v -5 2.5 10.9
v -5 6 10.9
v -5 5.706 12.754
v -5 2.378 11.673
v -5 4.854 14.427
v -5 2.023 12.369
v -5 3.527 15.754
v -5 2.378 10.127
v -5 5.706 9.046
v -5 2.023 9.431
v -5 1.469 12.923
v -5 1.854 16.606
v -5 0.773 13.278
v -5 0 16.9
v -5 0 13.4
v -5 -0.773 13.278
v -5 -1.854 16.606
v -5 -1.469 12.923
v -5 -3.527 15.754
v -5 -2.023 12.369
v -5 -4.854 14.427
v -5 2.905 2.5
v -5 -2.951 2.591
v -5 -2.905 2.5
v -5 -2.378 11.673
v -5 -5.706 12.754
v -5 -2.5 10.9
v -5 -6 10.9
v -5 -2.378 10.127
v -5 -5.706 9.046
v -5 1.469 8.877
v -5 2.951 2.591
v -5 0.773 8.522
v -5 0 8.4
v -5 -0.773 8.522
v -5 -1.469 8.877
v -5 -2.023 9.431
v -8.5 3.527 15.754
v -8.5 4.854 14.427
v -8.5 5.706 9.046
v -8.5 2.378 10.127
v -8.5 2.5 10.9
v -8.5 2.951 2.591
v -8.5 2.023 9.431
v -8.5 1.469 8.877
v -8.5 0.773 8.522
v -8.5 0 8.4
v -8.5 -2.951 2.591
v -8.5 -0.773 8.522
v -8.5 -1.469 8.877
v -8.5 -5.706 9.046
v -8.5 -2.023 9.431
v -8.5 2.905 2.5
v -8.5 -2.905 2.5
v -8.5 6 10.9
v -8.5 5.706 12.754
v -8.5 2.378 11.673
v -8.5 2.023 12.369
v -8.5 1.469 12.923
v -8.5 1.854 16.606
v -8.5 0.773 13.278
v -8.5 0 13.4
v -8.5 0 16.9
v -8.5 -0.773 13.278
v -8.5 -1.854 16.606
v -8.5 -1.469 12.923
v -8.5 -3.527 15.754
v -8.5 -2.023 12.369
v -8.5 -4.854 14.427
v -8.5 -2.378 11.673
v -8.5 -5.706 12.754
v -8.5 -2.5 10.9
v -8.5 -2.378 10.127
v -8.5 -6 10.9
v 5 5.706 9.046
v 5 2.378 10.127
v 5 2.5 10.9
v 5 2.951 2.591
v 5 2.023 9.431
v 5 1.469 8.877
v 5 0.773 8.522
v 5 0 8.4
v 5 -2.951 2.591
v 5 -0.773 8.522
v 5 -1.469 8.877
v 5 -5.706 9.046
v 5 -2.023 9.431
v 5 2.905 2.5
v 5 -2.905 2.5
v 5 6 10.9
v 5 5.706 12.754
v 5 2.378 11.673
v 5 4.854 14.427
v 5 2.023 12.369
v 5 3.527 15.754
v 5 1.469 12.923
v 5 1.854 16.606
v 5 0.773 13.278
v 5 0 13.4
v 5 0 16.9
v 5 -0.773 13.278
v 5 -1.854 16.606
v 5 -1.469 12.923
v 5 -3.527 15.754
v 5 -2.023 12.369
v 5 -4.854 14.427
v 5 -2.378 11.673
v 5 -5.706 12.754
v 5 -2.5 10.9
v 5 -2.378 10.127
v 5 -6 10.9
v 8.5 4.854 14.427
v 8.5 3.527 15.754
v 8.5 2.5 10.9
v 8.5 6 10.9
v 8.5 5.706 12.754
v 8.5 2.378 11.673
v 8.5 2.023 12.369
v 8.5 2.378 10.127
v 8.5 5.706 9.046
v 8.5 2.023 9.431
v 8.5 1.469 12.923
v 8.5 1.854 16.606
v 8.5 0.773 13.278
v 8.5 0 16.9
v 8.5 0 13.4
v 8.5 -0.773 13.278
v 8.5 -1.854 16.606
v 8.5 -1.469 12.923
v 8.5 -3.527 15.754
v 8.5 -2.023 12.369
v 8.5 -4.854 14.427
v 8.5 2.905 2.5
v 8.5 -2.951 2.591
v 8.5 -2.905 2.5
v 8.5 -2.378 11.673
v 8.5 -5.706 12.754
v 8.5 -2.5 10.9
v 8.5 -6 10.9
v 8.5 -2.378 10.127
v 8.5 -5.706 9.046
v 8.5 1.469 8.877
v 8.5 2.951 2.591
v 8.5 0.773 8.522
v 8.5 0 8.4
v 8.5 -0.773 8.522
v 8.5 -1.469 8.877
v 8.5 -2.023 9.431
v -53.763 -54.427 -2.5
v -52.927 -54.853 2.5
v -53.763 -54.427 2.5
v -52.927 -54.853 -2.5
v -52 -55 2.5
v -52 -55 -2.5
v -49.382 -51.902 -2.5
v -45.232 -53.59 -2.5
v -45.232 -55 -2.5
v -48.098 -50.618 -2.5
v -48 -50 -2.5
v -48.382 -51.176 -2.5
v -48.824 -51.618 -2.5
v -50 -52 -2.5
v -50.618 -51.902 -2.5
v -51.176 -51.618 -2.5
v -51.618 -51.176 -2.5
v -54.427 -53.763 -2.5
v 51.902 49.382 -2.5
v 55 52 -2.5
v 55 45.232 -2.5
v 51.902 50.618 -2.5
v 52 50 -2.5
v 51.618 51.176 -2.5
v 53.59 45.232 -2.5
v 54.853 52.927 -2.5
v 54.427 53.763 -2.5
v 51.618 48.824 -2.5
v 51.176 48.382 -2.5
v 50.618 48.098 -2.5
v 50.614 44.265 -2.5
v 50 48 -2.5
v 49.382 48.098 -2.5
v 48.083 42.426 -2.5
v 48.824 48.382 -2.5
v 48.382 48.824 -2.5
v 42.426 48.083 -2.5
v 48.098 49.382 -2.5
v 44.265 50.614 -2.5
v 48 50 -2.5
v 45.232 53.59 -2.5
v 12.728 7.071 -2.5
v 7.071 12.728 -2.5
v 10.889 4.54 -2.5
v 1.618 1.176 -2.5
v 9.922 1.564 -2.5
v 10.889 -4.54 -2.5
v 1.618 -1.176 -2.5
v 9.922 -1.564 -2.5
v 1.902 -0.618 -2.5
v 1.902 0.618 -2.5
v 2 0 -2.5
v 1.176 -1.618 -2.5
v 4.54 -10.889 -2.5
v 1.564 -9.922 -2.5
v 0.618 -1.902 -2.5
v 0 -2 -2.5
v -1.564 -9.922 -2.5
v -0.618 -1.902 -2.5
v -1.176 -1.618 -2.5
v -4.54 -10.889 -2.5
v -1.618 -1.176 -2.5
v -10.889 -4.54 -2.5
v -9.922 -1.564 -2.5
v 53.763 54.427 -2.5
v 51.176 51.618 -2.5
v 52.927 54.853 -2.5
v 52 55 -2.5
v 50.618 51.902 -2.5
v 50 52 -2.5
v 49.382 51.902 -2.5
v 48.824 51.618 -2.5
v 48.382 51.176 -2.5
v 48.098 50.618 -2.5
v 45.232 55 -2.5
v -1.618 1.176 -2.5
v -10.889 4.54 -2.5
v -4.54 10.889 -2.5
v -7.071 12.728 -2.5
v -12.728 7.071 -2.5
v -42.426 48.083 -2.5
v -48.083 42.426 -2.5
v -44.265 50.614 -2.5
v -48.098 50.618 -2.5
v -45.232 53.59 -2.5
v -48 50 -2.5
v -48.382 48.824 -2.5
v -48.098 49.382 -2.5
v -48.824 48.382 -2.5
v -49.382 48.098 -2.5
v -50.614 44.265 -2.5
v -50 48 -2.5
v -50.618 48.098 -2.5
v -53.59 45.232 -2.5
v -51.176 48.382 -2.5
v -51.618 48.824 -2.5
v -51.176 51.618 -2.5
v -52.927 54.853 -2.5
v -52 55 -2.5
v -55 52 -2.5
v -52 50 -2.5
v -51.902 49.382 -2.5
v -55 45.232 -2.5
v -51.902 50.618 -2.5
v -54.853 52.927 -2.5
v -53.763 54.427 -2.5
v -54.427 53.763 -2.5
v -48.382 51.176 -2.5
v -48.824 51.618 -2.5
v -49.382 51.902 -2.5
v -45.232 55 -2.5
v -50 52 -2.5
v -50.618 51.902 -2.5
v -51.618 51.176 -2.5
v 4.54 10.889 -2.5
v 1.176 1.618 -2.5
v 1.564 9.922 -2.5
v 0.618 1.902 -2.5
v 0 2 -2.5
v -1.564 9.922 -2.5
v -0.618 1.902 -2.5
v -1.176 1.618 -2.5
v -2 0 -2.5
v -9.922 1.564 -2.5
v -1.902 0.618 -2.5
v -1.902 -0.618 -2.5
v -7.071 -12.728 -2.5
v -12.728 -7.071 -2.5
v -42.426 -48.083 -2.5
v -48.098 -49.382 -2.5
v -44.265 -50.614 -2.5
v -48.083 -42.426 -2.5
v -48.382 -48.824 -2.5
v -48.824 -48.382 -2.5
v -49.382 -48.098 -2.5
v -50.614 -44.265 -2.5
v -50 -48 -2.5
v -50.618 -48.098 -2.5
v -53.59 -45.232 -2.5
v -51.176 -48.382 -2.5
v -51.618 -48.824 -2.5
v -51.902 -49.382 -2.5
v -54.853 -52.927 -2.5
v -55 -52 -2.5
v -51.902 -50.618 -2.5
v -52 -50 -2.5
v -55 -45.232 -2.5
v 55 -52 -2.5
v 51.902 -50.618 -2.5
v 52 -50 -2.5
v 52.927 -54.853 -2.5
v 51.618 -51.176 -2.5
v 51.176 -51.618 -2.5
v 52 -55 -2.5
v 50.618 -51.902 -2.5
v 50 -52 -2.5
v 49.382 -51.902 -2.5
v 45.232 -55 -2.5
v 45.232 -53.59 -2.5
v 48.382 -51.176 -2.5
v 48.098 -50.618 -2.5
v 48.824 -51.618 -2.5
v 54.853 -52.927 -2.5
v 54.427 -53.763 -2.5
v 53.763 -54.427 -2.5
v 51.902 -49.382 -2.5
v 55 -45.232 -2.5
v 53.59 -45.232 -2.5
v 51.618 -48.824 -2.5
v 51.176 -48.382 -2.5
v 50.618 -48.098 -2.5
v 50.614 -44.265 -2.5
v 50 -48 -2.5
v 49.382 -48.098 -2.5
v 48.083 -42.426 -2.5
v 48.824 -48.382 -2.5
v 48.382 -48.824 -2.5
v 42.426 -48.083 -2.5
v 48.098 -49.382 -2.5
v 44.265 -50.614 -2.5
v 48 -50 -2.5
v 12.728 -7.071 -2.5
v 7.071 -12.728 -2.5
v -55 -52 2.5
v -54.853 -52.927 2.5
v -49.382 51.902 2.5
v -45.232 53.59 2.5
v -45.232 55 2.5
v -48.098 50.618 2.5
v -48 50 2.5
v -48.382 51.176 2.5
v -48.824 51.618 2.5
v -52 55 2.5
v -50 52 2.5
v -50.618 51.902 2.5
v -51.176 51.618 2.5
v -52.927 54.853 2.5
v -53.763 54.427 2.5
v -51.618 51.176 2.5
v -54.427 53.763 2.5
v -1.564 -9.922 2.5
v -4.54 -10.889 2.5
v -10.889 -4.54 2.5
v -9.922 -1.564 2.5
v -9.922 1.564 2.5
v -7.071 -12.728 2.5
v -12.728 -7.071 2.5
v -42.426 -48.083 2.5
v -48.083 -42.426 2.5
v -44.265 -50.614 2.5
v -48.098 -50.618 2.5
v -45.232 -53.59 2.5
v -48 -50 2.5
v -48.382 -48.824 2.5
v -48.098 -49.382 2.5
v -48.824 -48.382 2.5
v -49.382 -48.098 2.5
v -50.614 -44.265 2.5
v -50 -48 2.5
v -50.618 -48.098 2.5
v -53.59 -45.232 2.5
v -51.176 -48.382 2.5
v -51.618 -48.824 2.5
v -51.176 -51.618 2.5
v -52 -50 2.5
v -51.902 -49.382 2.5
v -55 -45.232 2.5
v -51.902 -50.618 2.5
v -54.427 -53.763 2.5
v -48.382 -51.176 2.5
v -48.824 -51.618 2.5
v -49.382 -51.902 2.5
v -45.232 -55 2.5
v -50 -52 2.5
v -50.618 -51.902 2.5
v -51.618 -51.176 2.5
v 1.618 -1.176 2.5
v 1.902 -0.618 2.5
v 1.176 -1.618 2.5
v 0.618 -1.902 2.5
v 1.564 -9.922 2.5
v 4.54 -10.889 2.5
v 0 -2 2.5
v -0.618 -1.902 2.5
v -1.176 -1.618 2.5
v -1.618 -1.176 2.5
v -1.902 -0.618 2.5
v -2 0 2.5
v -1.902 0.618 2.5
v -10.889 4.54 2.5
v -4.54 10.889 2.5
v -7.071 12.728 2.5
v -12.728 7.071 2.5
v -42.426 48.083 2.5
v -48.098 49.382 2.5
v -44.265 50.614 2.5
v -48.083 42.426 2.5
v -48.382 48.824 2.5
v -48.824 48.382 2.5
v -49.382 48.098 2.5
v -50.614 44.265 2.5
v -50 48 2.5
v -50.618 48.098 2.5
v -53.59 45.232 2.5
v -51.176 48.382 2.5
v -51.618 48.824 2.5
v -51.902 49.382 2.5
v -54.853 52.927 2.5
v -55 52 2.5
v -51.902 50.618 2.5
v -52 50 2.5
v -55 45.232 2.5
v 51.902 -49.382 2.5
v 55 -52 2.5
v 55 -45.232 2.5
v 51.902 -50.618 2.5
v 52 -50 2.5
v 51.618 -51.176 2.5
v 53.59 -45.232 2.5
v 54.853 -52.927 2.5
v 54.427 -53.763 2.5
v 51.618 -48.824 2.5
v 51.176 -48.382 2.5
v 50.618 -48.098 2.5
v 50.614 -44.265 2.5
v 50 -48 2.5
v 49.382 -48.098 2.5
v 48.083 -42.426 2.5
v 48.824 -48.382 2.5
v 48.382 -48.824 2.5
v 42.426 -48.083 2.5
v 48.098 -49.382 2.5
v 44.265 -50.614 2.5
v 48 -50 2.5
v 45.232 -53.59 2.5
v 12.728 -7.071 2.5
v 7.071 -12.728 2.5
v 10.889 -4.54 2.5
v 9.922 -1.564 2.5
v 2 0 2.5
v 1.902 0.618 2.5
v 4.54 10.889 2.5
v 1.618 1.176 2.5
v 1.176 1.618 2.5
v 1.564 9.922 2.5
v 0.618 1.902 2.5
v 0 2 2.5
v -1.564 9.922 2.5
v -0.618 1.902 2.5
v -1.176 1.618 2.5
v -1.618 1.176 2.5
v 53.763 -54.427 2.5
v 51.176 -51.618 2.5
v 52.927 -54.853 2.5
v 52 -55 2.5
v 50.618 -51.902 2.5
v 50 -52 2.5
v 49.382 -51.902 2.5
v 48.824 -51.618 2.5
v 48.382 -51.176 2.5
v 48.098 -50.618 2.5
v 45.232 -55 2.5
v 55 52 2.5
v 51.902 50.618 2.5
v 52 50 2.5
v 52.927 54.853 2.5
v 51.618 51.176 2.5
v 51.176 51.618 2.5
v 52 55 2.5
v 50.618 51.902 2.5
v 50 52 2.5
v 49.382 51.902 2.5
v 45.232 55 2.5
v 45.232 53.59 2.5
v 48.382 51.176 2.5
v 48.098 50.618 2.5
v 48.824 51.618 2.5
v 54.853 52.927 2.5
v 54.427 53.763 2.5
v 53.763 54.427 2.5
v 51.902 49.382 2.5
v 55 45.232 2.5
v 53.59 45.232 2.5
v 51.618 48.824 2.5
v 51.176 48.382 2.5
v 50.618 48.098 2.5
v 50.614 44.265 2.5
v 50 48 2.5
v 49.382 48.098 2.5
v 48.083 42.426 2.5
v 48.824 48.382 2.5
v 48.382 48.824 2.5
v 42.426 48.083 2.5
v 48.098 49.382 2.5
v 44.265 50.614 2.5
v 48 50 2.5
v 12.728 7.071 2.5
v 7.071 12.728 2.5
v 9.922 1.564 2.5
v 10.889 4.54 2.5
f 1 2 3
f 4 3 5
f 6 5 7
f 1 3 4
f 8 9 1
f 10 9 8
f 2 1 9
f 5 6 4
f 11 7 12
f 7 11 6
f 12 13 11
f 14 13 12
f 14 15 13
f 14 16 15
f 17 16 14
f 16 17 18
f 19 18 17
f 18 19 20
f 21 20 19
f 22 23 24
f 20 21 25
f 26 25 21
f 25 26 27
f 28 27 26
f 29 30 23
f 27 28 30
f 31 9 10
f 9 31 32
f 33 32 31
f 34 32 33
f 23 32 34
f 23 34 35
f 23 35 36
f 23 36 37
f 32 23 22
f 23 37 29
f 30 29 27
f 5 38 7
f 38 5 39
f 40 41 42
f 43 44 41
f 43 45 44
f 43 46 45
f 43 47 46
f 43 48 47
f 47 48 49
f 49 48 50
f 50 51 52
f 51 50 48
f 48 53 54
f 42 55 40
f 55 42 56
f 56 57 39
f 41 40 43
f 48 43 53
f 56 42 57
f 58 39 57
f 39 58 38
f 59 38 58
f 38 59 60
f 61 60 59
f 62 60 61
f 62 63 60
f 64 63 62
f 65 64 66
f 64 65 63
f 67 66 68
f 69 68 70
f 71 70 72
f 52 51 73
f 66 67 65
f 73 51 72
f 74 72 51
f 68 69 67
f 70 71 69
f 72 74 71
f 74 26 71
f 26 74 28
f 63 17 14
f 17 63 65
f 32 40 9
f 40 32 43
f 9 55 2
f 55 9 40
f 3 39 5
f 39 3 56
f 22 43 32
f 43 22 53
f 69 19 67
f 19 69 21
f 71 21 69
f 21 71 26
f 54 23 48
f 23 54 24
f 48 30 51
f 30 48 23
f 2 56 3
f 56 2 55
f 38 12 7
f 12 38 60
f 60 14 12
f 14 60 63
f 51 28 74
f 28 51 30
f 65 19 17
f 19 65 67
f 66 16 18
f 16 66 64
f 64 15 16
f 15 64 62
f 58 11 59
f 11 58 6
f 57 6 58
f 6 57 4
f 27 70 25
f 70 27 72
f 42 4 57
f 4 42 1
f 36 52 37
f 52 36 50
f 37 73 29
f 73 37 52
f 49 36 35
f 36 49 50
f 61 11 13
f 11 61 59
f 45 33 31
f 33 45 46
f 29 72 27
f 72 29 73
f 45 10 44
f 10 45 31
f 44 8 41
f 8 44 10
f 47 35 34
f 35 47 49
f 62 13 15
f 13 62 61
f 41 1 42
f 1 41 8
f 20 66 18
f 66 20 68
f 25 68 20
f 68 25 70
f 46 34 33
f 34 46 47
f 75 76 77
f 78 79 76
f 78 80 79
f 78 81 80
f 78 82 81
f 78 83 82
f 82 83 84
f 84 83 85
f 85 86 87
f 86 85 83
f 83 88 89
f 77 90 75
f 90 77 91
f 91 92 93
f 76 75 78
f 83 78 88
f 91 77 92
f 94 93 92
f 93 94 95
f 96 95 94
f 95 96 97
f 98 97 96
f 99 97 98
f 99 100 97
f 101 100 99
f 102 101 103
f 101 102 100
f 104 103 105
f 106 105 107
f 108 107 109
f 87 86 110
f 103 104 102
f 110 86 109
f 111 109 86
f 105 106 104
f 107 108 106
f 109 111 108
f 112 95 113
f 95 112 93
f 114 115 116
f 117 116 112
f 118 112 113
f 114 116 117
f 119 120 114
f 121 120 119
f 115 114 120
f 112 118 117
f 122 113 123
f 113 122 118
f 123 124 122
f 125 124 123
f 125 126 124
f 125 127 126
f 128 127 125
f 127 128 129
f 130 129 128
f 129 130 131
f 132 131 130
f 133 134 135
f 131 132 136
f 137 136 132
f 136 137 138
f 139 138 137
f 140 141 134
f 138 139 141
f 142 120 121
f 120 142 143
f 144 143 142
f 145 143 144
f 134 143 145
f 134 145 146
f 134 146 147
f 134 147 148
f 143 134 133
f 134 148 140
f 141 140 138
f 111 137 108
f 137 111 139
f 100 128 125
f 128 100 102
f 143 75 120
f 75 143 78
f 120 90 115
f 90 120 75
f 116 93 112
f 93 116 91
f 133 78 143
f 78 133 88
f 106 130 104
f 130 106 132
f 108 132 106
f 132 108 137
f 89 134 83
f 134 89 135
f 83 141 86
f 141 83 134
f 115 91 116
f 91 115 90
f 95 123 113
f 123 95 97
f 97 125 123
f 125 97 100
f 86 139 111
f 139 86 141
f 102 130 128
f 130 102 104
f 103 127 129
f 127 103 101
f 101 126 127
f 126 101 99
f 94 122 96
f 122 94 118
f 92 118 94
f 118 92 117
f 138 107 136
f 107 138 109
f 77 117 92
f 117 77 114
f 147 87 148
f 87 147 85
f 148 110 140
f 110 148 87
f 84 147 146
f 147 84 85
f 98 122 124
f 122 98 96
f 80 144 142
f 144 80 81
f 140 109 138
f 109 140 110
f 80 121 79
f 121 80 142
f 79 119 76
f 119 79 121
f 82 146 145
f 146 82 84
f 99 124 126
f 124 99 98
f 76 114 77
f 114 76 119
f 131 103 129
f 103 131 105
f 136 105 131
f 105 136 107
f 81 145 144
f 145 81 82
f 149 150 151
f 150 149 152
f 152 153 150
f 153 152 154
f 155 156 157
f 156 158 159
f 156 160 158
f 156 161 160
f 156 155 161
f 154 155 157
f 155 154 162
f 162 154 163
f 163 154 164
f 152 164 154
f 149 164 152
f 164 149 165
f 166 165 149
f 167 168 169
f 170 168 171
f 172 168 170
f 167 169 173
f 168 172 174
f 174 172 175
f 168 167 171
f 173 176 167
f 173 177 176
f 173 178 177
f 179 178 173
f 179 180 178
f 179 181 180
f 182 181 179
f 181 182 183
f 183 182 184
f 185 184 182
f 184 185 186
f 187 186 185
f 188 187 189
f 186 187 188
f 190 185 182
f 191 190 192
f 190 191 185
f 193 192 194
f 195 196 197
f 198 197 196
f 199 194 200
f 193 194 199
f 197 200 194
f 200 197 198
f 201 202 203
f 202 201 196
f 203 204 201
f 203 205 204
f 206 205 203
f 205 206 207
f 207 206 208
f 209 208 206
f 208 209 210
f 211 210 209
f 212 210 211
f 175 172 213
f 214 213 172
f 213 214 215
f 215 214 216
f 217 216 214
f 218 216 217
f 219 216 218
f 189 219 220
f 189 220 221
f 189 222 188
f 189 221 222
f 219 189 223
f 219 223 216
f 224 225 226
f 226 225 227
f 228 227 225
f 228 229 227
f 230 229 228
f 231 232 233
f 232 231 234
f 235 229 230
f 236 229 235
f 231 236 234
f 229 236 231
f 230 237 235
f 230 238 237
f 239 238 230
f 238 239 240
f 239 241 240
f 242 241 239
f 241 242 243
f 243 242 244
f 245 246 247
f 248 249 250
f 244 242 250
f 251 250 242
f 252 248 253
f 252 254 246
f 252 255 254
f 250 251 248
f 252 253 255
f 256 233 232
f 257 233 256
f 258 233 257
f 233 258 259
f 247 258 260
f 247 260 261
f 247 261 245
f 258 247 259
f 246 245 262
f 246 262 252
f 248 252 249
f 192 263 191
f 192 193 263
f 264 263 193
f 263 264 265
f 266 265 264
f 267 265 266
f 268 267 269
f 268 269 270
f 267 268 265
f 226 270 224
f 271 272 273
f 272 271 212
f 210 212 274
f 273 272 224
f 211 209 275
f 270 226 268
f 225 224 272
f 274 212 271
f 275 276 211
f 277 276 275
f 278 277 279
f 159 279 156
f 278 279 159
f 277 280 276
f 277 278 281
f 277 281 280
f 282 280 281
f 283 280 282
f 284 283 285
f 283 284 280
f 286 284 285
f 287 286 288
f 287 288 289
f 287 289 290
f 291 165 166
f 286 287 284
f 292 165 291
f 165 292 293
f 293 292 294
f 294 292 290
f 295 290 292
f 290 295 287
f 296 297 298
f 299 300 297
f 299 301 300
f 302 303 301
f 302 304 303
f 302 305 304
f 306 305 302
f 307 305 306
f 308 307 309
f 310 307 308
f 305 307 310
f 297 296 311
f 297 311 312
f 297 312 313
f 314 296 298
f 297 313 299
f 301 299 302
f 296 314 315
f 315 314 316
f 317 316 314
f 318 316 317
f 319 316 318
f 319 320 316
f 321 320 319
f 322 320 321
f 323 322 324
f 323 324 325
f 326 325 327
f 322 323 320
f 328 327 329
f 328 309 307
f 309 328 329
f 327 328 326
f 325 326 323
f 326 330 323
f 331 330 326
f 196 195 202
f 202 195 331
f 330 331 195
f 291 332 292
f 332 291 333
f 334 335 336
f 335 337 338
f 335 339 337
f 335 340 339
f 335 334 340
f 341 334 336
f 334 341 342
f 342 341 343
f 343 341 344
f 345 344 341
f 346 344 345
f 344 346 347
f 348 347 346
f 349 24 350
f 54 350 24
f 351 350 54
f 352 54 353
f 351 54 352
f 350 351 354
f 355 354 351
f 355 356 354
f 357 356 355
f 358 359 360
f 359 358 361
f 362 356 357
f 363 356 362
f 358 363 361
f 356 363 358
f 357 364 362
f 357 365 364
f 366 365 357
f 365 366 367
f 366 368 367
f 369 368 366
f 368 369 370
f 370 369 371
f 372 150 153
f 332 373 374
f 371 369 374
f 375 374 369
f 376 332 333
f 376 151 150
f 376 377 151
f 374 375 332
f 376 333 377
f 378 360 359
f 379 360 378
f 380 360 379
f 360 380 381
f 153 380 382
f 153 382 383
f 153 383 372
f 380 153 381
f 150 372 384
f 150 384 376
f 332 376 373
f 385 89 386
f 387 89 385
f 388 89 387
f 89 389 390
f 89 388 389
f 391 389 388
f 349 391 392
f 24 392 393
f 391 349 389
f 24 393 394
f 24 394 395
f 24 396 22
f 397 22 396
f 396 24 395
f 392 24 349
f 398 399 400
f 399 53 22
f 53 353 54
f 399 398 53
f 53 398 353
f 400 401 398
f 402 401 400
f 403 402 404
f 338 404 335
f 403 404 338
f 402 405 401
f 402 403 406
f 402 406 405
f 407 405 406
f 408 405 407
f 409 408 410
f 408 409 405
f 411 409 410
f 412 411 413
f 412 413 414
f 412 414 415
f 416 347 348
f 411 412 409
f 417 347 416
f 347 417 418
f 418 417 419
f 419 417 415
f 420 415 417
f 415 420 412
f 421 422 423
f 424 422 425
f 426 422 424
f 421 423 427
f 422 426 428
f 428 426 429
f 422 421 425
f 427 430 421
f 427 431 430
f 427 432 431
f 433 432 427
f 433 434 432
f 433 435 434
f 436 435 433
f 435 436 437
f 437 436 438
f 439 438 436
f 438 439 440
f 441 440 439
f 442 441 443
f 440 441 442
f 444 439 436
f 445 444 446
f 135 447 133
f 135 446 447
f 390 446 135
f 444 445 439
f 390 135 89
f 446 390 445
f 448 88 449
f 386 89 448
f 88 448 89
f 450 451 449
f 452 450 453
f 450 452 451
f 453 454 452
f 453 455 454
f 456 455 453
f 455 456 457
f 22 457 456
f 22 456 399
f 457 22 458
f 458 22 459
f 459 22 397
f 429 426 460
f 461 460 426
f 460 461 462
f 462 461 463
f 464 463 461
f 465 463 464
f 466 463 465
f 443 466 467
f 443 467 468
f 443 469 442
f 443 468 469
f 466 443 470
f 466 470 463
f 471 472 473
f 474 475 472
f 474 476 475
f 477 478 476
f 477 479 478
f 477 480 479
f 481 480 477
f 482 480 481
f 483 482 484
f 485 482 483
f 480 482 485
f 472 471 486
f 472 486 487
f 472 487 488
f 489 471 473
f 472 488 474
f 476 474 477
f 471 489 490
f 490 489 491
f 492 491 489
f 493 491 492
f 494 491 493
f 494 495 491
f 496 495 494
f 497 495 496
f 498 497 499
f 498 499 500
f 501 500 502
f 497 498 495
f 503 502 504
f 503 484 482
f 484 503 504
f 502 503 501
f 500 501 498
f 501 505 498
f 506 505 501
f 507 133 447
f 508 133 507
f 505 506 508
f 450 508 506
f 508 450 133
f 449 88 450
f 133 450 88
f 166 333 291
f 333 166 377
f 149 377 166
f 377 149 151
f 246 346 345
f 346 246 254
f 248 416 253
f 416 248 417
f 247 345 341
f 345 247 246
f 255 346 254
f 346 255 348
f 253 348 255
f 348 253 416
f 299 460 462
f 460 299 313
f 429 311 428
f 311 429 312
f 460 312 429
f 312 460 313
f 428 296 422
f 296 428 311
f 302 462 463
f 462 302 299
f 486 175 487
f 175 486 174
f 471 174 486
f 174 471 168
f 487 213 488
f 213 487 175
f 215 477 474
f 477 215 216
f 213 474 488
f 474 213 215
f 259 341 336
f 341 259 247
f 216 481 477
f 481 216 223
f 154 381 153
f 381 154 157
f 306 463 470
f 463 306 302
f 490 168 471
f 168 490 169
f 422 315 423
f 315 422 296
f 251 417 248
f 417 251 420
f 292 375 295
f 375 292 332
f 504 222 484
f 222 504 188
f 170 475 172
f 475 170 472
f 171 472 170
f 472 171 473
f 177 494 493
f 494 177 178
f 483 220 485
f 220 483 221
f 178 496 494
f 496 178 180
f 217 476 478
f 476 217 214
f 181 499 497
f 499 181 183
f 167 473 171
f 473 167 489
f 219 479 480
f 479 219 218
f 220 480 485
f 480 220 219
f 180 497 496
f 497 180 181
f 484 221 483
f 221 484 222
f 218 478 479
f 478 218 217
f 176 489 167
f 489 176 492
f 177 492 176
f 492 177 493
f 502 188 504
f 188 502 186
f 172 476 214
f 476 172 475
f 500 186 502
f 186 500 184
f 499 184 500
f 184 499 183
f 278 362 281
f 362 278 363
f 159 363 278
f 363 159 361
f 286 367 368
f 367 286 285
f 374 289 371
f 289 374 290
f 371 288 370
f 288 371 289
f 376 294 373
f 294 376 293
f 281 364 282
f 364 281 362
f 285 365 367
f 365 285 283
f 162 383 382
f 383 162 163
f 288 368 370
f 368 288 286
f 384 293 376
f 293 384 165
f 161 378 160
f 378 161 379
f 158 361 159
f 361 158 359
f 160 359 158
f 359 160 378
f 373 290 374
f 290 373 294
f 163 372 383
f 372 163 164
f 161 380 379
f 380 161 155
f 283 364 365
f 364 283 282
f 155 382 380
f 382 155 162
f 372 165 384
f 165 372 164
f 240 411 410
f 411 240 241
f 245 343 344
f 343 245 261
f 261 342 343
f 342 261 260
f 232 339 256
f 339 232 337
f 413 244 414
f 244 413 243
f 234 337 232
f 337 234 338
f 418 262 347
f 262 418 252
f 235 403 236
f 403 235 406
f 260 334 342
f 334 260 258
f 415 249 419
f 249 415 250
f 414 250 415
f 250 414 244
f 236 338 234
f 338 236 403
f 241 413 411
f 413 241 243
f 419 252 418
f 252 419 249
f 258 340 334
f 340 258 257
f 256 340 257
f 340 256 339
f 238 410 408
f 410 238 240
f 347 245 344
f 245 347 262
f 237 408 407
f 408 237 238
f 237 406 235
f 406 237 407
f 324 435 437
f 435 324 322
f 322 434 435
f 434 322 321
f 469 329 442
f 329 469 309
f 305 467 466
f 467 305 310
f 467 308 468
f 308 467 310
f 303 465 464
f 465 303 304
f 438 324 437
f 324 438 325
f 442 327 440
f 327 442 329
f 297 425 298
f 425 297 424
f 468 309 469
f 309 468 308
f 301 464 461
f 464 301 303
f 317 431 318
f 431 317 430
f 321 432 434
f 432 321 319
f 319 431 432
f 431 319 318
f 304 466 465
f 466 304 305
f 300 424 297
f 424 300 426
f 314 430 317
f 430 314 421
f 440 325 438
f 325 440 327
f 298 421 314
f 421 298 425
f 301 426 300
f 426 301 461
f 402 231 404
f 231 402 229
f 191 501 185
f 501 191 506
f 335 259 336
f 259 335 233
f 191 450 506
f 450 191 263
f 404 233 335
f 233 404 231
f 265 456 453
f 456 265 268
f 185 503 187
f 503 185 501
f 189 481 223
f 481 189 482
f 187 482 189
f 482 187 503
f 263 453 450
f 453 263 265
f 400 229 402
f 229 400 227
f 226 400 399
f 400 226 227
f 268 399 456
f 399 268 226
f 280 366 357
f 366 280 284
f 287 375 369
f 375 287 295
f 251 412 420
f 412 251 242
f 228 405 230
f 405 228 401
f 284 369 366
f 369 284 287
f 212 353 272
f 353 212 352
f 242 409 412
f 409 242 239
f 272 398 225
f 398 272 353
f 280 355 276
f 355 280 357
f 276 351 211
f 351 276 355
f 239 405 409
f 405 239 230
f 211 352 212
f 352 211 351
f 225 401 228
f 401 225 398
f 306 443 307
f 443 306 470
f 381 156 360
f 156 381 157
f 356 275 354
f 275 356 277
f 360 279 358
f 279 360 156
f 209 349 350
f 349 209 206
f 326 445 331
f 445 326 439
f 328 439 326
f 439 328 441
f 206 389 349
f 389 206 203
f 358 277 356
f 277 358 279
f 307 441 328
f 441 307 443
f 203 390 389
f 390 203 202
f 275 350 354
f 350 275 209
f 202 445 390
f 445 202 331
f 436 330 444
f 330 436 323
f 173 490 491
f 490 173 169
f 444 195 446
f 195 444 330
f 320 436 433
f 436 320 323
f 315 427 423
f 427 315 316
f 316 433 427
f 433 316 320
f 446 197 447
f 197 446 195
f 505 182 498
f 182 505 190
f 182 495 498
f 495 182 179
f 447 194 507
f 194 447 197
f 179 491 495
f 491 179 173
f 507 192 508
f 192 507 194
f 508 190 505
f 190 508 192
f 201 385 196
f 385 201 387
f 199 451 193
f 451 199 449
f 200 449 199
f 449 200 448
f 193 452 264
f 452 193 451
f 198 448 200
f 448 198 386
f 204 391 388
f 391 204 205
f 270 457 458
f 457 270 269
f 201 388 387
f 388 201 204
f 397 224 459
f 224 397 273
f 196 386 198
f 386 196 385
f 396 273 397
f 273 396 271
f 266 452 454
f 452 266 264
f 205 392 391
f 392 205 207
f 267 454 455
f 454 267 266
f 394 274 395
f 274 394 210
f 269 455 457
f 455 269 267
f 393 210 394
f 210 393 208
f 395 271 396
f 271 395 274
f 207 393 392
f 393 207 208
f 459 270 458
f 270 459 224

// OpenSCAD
use <MCAD/boxes.scad>

$fn =20; 

vesaDimensionXY =100;
holeRadius=2.5;
hookDistance = 5;
hookThickness = 3.5;
bracketThickness=5;
bindingValue=0.1;
bracketWidth = 4;
screwRadius=2;

/*
		Building the vesa mount stand 
*/
vesaBracket();

module vesaBracket(vesaBracketWanted=true){
	


	// the hook
	module mkHook(){
				
		translate([-hookDistance-(hookThickness)/2,0,bracketThickness-bindingValue])rotate([90,-90,90])difference(){
		hull(){
					
					roundedBox(size=[6,6,hookThickness],radius=1, sidesonly=true);
					translate([6,0,0]) cylinder(r=6,h=hookThickness,center=true);
					
				}
		translate([6,0,0])cylinder(r=holeRadius,h=hookThickness+1,center=true);
		}
	
	}

	// cutting the sides off
	module triangle(side1, side2, corner_radius, triangle_hight){
	
		translate([corner_radius+bracketWidth, corner_radius+bracketWidth,0])
		hull(){
		
			cylinder(r=corner_radius, h=triangle_hight,center=true);
			translate([side1-(2*corner_radius), 0,0]) cylinder(r=corner_radius, h=triangle_hight, center=true);
			translate([0,side2-(2*corner_radius)],0) cylinder(r=corner_radius, h=triangle_hight, center=true);
			}
	}

	// holes
	module mkHole() {
		
		for(i=[45:90:360]){
		
			translate([((vesaDimensionXY/2)/sin(i))*cos(i),((vesaDimensionXY/2)/cos(i))*sin(i),0]) cylinder(r=screwRadius,h=bracketThickness+1,center=true);
		}
	}

	if(vesaBracketWanted){
	
		mkHook() ;
		mirror([4,0,0]) mkHook();
		difference(){

			roundedBox(size = [110,110,bracketThickness],radius = 3 ,sidesonly=true);
	
		// middle hole
			cylinder(r=screwRadius, h=bracketThickness+1, center=true);
		// sides holes
		mkHole();
			rotate([0,0,90])mkHole();
		
			for(i=[45:90:359]){
				rotate([0,0,i])triangle(70,70,10,7);  
				}
			}
	}
}
